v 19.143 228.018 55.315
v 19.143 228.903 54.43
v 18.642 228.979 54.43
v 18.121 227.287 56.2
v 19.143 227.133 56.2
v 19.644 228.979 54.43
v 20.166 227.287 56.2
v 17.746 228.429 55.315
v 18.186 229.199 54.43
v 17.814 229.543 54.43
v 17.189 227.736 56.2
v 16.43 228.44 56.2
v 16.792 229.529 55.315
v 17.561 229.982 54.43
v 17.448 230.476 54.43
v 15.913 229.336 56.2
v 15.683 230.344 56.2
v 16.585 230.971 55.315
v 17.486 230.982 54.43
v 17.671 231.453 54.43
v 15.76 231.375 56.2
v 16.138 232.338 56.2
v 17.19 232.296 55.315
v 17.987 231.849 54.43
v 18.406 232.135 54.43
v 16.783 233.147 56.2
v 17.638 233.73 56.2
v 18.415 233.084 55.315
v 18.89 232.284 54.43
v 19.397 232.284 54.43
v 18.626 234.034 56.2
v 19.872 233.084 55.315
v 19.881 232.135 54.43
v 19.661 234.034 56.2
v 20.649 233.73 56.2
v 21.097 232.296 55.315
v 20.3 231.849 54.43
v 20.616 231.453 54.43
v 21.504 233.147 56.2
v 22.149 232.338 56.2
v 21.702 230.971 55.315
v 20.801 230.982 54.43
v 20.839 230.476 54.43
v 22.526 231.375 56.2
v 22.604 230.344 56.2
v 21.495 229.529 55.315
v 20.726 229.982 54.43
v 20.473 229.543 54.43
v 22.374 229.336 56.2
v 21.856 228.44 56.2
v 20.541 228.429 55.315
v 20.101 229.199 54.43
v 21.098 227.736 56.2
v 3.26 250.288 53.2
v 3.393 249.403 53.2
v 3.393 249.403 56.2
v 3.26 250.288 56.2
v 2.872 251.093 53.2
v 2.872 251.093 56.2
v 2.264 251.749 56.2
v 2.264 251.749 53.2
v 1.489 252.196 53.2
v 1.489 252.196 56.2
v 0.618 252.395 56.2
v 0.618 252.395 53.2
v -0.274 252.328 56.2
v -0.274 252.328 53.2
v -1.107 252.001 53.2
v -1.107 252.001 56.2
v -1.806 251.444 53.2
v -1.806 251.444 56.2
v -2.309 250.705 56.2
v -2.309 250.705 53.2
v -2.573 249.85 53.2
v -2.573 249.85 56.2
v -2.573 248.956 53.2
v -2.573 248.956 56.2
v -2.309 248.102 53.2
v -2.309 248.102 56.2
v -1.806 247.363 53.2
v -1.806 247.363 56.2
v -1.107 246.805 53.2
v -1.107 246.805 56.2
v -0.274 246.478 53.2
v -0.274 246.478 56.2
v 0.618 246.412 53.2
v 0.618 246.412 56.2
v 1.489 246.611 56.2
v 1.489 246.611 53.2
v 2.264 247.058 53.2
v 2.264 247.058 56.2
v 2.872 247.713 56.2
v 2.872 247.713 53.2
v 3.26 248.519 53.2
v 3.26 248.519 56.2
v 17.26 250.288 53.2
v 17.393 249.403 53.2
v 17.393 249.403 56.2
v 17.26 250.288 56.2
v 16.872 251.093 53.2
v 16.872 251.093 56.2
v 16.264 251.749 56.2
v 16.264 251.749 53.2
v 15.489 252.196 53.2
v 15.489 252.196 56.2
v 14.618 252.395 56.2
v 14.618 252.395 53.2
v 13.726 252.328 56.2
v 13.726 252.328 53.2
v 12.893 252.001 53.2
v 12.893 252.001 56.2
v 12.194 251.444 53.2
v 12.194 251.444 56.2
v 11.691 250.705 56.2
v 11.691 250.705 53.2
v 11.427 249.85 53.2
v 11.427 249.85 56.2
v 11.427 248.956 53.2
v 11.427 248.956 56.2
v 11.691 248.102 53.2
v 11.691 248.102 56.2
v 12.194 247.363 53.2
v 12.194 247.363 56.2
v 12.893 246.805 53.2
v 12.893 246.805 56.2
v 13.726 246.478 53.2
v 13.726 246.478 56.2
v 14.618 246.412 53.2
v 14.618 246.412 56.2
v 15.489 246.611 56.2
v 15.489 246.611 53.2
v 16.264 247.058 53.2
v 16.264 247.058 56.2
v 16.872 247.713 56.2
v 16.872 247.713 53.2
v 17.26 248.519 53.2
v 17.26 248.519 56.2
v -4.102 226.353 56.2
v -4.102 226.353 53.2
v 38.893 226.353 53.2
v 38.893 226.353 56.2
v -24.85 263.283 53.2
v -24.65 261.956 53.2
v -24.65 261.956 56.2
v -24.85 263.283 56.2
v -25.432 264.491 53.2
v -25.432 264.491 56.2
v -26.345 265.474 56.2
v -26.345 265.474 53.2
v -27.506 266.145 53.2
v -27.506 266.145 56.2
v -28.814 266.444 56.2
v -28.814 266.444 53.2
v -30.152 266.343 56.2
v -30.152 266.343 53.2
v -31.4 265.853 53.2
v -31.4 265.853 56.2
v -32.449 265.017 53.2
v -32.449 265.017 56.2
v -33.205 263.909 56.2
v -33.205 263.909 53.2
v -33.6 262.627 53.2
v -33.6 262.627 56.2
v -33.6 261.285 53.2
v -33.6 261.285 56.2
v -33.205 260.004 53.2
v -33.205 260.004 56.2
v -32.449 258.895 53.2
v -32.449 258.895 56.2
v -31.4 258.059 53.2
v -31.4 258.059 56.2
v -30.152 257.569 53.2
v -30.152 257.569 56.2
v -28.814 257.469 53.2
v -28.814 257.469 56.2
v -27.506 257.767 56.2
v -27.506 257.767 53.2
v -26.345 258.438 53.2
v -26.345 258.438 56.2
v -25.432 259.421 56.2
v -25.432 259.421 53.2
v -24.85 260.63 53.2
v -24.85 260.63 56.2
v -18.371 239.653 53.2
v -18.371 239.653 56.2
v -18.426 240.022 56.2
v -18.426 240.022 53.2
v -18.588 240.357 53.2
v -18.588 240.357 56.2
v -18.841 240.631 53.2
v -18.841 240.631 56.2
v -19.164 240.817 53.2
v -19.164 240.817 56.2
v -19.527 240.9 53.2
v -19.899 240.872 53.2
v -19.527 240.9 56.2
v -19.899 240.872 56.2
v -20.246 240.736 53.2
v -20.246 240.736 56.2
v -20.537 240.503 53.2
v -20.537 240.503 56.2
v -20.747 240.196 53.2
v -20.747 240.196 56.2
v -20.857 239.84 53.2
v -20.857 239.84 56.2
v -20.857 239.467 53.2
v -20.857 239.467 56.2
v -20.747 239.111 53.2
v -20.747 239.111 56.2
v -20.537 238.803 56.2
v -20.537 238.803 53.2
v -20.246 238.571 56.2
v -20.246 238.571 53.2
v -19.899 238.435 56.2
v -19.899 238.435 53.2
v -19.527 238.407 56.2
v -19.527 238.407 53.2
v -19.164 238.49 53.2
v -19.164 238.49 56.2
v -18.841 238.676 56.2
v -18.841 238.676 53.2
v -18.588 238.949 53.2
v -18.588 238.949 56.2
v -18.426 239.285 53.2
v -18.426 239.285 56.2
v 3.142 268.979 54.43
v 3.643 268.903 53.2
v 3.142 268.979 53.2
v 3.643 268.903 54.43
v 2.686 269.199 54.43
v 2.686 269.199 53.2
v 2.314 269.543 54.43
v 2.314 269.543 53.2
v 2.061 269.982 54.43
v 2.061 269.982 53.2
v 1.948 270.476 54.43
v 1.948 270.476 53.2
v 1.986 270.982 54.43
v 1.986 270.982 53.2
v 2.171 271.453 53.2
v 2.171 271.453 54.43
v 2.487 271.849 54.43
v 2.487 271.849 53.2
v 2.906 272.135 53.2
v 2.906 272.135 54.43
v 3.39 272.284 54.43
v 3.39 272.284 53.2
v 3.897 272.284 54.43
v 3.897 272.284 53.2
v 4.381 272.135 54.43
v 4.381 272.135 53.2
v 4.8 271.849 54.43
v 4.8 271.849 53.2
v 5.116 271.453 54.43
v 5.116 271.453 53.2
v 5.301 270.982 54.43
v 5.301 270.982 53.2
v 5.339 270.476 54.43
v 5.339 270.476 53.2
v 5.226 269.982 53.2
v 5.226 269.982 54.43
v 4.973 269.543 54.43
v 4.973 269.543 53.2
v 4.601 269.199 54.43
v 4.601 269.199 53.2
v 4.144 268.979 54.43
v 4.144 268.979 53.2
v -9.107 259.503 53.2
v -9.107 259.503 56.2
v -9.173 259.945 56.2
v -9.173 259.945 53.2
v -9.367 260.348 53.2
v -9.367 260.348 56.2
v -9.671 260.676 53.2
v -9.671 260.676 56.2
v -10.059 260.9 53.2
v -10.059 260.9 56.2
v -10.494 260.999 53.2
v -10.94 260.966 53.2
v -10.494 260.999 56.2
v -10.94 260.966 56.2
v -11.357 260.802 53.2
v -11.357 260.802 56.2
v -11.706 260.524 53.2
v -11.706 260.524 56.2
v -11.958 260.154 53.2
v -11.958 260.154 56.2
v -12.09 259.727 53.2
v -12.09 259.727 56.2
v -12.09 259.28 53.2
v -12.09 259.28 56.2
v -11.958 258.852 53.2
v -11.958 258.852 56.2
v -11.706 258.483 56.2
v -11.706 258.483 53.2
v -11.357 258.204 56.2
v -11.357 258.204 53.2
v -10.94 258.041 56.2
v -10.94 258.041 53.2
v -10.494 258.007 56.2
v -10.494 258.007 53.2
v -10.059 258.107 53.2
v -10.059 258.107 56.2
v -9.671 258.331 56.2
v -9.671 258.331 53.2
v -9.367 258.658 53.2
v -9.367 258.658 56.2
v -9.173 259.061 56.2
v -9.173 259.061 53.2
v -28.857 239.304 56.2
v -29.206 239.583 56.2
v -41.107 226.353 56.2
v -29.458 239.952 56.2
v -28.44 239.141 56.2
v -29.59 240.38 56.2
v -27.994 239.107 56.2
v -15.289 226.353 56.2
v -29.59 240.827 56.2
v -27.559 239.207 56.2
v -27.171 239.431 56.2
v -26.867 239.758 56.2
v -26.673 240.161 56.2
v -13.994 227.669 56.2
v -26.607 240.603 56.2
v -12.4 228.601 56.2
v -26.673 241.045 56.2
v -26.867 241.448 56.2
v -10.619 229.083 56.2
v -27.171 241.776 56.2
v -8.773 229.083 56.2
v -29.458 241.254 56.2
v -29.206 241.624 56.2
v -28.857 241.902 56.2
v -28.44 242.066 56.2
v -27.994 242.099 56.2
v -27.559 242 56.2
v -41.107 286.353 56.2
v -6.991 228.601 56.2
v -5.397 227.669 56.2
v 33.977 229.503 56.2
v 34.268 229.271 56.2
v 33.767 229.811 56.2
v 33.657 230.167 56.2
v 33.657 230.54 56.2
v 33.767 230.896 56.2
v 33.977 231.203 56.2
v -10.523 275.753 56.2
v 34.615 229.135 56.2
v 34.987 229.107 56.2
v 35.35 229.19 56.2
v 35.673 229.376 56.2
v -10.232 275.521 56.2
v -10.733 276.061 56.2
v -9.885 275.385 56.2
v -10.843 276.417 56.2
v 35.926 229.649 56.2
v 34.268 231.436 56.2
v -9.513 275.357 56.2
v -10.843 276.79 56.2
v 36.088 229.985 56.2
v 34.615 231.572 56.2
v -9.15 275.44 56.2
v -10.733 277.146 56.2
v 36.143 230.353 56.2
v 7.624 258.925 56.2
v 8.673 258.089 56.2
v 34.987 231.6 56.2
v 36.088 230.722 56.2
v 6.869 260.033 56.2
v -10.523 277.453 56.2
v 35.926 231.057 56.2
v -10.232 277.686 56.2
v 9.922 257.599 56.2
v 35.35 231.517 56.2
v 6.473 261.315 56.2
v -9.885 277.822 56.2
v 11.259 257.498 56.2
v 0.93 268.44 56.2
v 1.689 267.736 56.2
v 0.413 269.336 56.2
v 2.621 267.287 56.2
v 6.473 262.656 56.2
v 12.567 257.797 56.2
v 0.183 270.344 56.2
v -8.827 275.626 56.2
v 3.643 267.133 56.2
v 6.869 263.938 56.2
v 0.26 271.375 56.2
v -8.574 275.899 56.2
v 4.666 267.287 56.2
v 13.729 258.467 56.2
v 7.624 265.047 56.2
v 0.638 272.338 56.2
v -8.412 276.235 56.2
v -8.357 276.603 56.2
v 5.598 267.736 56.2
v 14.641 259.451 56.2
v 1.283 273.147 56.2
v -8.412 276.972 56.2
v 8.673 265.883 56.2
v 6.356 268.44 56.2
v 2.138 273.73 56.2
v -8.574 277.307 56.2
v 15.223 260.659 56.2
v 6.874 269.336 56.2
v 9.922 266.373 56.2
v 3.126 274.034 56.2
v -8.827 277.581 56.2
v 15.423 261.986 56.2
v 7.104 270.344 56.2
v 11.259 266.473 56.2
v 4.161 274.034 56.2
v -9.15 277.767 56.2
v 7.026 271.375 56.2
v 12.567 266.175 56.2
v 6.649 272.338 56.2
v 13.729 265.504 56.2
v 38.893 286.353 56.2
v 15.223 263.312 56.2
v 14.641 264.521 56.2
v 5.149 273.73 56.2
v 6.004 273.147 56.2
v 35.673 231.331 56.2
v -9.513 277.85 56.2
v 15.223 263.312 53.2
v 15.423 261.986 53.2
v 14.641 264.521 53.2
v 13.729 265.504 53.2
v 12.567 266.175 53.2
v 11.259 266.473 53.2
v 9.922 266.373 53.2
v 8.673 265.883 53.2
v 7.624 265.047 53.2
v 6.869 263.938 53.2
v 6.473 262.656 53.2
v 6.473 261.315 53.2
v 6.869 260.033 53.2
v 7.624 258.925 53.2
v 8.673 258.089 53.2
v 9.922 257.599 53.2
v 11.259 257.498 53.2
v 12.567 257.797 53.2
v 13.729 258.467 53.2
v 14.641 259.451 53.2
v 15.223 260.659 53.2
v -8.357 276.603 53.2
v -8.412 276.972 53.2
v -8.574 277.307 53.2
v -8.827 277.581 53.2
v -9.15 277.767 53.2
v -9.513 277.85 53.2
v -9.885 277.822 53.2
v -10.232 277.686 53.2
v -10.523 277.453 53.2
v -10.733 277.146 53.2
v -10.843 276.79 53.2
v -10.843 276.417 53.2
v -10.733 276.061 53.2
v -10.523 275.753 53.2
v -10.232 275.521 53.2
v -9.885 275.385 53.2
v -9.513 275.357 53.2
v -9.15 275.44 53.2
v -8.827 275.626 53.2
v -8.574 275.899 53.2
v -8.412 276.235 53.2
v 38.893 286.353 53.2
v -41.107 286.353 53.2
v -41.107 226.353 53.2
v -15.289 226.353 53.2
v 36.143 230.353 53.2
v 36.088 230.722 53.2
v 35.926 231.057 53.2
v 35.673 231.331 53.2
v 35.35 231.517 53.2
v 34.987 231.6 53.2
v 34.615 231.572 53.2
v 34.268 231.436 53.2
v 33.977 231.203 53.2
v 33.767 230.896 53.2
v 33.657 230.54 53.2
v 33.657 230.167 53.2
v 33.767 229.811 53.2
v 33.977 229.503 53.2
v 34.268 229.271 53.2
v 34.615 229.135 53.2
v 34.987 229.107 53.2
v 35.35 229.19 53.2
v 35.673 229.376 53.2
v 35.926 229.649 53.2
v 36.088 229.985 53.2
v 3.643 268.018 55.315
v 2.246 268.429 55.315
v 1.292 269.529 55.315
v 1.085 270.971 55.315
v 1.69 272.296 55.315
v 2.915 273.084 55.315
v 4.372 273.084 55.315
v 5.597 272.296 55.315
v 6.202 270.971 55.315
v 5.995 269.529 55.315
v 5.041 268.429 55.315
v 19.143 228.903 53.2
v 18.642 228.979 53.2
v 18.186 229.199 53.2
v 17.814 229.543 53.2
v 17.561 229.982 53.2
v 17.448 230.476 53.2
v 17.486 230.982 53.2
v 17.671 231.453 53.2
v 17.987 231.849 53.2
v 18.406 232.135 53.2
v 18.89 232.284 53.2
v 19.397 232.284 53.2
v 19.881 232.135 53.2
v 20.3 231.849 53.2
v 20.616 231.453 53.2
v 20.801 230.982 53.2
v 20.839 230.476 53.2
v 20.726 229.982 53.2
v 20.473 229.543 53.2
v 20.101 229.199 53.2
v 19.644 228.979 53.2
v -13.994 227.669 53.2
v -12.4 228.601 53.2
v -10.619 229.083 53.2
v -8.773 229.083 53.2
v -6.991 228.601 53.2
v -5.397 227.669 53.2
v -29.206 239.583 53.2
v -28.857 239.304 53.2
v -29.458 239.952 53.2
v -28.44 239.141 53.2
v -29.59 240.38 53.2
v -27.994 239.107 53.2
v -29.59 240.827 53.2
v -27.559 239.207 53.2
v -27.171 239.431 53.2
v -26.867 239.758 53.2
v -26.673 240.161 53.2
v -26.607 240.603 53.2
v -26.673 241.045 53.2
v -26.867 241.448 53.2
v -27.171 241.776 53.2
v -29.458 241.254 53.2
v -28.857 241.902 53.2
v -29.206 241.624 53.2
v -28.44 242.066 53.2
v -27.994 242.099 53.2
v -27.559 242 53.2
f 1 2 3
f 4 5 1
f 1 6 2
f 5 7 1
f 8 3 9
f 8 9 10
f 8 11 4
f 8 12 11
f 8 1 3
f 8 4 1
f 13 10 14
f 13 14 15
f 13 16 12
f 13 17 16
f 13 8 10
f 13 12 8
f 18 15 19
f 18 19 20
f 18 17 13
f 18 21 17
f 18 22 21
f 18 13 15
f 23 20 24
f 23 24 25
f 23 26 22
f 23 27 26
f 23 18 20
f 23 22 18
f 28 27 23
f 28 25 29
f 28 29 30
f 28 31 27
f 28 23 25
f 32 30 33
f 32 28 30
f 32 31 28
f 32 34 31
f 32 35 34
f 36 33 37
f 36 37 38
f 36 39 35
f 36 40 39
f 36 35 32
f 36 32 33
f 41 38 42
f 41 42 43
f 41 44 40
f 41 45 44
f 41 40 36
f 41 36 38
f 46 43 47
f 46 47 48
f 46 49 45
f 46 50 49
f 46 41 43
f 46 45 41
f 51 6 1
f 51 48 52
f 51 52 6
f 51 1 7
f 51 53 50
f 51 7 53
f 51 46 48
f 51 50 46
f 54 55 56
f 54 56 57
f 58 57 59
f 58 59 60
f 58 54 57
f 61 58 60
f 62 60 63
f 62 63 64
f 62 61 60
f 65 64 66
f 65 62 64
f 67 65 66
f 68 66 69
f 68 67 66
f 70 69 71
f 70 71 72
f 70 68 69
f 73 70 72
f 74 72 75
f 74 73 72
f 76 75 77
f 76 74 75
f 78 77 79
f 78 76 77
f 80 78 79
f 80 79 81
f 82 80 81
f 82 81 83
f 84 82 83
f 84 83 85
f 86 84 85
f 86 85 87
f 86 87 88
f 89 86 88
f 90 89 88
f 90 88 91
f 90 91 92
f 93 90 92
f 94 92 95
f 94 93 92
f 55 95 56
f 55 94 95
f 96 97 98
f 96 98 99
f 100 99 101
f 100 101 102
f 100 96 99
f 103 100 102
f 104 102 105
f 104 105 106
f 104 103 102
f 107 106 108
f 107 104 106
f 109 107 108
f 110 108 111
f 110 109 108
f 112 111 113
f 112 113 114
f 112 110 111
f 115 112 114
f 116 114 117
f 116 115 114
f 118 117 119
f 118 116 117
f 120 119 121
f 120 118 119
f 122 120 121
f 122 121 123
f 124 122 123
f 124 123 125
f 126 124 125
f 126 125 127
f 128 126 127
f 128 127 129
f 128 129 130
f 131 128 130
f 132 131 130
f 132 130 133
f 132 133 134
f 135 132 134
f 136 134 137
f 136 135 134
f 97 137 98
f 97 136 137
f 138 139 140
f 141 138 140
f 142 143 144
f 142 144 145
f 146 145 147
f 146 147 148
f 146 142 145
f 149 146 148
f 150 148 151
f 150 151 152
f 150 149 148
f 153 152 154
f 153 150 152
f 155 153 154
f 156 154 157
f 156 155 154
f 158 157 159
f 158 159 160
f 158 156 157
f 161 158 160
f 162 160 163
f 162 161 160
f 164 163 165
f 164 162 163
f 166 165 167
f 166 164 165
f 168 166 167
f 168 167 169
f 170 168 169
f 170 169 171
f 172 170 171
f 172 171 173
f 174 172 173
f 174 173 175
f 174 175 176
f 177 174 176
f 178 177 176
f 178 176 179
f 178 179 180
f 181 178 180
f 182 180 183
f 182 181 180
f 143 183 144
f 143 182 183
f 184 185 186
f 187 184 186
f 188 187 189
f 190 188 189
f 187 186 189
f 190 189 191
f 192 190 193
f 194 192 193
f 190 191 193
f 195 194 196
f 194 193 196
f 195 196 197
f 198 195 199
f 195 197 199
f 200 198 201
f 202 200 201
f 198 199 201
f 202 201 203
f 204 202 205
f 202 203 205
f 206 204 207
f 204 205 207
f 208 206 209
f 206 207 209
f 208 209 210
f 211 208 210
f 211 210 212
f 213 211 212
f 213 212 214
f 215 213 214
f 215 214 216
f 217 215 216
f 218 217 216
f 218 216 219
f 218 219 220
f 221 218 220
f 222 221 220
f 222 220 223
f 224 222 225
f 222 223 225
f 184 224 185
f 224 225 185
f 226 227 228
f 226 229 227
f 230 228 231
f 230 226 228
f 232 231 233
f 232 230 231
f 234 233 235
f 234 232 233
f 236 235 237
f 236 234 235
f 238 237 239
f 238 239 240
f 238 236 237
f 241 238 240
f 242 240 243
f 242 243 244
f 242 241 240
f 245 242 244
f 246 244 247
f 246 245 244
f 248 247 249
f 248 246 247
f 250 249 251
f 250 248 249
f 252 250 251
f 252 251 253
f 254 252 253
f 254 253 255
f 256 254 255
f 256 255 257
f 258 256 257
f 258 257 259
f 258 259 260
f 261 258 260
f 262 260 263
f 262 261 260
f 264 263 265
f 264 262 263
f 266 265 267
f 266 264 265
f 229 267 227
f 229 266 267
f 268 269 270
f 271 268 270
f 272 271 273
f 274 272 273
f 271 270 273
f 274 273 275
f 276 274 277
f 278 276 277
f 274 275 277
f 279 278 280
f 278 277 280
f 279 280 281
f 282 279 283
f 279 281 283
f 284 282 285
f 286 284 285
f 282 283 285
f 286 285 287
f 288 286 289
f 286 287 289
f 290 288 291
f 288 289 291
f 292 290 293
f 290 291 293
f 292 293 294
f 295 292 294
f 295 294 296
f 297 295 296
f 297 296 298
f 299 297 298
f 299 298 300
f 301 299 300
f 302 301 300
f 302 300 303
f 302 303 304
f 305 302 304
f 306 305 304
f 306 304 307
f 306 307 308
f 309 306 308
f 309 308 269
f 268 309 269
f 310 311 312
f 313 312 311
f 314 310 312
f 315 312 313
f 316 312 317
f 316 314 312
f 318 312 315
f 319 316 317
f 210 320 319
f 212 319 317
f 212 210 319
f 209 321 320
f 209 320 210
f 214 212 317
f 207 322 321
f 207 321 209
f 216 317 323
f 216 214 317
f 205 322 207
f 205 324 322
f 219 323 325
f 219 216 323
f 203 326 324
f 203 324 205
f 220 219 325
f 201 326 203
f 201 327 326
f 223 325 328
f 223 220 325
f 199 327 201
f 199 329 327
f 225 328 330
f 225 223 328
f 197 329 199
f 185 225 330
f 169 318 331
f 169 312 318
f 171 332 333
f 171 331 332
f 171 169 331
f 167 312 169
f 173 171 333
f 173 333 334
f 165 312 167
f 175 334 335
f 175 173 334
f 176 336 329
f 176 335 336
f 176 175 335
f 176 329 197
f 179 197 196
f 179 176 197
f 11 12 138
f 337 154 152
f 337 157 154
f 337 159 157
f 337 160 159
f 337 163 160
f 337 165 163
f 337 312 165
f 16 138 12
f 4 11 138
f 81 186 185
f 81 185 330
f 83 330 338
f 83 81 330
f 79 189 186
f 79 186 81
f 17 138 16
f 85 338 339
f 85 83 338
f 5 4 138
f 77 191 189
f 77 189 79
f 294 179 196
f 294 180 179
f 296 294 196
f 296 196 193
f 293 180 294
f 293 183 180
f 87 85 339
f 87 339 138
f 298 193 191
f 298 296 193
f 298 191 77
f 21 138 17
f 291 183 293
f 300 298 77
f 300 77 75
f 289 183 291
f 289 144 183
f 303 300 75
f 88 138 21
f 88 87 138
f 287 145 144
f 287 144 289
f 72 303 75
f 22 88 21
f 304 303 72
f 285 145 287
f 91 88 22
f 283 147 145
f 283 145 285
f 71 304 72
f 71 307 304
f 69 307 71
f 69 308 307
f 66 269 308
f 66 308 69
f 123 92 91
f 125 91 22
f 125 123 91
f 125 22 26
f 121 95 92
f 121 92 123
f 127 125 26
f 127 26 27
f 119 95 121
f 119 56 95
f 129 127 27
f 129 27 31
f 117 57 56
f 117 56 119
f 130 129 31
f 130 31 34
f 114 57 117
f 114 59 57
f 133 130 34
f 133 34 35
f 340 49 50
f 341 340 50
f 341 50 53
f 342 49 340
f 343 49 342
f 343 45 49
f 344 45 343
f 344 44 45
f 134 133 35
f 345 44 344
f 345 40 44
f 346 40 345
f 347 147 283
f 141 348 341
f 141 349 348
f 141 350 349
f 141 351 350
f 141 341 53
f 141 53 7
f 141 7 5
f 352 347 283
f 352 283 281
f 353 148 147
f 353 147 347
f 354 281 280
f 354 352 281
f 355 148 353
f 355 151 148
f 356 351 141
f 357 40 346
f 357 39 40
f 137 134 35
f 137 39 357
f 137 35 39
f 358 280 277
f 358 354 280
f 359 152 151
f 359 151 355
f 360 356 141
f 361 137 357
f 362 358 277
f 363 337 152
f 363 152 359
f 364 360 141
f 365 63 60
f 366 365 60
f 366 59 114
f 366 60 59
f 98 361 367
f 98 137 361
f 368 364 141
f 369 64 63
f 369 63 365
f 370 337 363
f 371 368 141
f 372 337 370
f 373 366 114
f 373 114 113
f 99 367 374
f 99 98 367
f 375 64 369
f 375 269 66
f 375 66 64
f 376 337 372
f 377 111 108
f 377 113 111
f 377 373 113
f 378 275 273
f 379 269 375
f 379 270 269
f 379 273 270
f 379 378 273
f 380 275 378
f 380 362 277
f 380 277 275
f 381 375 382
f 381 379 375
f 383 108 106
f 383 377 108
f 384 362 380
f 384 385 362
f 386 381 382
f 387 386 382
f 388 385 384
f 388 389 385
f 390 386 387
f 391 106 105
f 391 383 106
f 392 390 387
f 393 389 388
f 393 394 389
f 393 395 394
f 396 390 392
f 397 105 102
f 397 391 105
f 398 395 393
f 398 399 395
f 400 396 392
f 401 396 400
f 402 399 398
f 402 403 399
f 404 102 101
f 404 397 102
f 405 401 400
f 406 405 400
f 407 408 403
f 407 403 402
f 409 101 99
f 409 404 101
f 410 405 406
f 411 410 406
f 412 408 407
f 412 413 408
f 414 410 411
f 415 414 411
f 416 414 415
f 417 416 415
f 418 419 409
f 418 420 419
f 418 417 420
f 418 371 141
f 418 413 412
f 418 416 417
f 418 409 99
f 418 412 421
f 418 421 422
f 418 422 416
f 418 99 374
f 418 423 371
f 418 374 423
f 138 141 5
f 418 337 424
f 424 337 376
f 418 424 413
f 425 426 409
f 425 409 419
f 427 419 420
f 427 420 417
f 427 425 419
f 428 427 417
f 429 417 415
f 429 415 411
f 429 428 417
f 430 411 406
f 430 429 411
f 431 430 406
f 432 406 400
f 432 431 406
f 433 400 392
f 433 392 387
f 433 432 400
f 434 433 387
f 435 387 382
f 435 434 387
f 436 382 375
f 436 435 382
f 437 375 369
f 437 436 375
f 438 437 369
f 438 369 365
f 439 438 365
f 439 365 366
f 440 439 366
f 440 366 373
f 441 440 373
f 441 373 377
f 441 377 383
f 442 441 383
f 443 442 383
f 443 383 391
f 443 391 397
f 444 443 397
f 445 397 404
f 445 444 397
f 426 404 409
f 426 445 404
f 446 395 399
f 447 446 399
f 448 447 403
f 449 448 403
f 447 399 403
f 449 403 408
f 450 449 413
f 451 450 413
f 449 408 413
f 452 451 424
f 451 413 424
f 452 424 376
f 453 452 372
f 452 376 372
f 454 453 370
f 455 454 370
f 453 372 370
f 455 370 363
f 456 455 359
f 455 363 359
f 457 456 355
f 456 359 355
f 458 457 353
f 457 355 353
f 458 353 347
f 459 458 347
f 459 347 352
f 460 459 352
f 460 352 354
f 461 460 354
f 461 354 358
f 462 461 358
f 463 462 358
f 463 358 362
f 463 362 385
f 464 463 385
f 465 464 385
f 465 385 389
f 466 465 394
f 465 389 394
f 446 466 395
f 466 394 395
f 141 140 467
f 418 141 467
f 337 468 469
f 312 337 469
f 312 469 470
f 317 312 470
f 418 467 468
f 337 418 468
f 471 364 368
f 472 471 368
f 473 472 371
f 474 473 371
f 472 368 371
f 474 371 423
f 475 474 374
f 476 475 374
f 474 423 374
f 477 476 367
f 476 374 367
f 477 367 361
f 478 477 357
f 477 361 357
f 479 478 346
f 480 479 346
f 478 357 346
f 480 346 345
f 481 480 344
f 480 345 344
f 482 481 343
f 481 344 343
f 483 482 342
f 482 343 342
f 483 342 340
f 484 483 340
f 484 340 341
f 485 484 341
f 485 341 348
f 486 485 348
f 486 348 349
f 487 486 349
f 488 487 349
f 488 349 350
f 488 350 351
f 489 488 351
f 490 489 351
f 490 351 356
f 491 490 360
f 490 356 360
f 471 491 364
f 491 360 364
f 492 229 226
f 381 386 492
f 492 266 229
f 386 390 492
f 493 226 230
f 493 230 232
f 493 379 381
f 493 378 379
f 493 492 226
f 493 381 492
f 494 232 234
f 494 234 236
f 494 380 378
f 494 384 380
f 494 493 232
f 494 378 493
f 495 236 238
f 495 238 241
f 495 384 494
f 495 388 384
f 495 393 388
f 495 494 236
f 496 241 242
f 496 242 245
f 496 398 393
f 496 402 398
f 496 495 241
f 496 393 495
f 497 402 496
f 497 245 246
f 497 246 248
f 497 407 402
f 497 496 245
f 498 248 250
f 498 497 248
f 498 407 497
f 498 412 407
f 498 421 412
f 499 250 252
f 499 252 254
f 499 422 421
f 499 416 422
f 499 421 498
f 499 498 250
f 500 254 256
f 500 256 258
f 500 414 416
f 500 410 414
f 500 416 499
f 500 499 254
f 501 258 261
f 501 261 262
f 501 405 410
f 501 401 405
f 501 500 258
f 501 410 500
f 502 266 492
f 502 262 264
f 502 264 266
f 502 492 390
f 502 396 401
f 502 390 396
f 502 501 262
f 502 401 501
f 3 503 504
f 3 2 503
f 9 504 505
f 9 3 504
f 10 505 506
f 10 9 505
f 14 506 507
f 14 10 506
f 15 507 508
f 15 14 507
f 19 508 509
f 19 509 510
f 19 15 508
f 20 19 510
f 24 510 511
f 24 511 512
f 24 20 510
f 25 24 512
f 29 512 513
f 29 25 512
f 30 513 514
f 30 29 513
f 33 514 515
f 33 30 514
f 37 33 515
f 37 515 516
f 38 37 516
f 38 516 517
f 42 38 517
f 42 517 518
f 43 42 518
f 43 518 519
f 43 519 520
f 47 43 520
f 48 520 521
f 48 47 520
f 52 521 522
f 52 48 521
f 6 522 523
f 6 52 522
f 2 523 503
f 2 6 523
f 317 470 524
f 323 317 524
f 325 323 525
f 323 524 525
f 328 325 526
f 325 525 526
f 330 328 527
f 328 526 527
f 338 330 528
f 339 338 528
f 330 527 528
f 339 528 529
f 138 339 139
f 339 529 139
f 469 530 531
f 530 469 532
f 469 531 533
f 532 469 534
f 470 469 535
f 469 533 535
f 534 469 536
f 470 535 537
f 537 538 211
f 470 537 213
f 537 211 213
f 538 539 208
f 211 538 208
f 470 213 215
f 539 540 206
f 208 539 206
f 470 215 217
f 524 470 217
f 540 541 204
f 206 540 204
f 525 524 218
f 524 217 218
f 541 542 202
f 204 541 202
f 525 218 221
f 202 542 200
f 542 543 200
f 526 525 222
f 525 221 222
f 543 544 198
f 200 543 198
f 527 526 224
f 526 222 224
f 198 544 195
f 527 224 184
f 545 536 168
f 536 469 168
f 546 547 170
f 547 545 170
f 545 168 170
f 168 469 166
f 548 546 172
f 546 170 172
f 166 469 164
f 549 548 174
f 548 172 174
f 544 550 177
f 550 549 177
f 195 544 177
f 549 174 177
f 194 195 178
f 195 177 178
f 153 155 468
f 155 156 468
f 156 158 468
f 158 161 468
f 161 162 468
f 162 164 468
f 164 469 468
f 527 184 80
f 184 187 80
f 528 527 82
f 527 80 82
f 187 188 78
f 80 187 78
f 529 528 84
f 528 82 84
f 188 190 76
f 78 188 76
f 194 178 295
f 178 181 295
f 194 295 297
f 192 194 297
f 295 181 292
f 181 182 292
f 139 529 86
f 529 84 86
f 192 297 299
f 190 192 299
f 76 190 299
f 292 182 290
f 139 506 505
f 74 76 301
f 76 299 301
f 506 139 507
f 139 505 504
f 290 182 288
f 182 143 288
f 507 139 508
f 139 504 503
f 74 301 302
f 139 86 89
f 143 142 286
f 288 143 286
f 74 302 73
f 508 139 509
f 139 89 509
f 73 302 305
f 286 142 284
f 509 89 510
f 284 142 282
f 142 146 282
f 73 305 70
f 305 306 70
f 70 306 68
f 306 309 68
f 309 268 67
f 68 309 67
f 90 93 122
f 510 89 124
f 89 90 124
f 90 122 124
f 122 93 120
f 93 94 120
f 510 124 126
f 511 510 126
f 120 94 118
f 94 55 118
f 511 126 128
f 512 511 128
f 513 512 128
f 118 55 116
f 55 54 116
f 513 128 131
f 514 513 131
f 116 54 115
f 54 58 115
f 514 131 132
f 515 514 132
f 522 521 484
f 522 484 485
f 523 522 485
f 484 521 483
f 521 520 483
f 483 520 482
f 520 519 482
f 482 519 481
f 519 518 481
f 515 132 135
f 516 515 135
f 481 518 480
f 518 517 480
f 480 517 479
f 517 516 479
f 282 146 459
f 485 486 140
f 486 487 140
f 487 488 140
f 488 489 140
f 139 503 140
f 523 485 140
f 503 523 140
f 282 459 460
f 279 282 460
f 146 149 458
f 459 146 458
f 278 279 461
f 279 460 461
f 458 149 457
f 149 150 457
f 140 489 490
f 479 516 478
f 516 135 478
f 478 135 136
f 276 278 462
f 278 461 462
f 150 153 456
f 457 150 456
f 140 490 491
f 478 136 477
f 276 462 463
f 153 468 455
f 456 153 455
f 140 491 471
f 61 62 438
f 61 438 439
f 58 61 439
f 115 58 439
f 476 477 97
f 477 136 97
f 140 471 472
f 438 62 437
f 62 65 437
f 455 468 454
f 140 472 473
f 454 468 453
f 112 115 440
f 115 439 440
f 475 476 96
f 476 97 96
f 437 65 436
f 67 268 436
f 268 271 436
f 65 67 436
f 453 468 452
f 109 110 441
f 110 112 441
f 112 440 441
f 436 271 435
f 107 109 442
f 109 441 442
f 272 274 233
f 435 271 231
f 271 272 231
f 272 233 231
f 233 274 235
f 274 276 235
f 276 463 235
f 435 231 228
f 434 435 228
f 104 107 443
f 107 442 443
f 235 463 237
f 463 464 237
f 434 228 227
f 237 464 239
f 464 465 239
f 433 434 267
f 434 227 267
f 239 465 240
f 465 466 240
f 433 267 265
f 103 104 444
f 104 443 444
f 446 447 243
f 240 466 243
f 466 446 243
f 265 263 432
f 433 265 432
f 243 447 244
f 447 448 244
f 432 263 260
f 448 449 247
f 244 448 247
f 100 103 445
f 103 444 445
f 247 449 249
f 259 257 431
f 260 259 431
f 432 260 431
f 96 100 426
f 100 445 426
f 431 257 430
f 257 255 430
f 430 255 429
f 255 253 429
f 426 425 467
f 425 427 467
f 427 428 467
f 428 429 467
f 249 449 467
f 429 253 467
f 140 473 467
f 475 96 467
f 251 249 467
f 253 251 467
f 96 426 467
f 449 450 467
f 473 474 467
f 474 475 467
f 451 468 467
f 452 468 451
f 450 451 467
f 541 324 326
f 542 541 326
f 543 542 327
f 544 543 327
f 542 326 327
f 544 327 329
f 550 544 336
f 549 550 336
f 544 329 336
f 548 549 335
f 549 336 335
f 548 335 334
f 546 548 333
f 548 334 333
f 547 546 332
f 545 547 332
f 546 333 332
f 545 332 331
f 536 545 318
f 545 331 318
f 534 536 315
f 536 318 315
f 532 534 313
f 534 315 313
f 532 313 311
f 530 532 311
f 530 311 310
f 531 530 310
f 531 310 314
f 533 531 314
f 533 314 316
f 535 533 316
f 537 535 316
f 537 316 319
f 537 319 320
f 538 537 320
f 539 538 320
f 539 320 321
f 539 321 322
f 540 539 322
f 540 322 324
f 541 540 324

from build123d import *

# Parameters (mm, degrees)
SKETCH_1_R                                   = 3
SKETCH_1_R_2                                 = 4.5
EXTRUDE_1_DEPTH                              = 3
CSK_FOR_M3_HEX_SOCKET_COUNTERSUNK_HE_2_COUNT = 2
CSK_FOR_M3_HEX_SOCKET_COUNTERSUNK_HE_2_PITCH = 42.898135158
SKETCH_2_R                                   = 1.5
SKETCH_2_R_2                                 = 1.25
CUT_EXTRUDE1_DEPTH                           = 10
SKETCH4_R                                    = 1.25
CUT_EXTRUDE2_DEPTH                           = 3


with BuildPart() as part:
    # Эскиз1 → Бобышка-Вытянуть1 (new body)
    with BuildSketch(Plane.XY.offset(53.2)):
        with BuildLine():
            Line((-4.102180416, 226.353254388), (38.893407272, 226.353254388))
            Line((38.893407272, 226.353254388), (38.893407272, 286.353254388))
            Line((38.893407272, 286.353254388), (-41.106592728, 286.353254388))
            Line((-41.106592728, 286.353254388), (-41.106592728, 226.353254388))
            Line((-41.106592728, 226.353254388), (-15.28891158, 226.353254388))
            ThreePointArc((-15.28891158, 226.353254388), (-9.695545998, 229.144425829), (-4.102180416, 226.353254388))
        make_face()
        with Locations((0.393407272, 249.403254388)):
            Circle(SKETCH_1_R, mode=Mode.SUBTRACT)
        with Locations((14.393407272, 249.403254388)):
            Circle(SKETCH_1_R, mode=Mode.SUBTRACT)
        with Locations((-29.150473778, 261.95614373)):
            Circle(SKETCH_1_R_2, mode=Mode.SUBTRACT)
        with Locations((10.923063266, 261.985726175)):
            Circle(SKETCH_1_R_2, mode=Mode.SUBTRACT)
    extrude(amount=EXTRUDE_1_DEPTH)

    # Sketch3 → CSK for M3 Hex Socket Countersunk Head Screw1 (revolve, cut)
    with BuildSketch(Plane(origin=(3.643407272, 270.603254388, 56.2), x_dir=(0, -1, 0), z_dir=(1, 0, 0))):
        Polygon((0, 0), (0, 3), (1.7, 3), (1.7, 1.77), (3.47, 0), align=None)
    csk_for_m3_hex_socket_countersunk_head_s = revolve(axis=Axis((3.643407272, 270.603254388, 62.55), (0, 0, -1)), mode=Mode.SUBTRACT)

    # CSK for M3 Hex Socket Countersunk He 2: CSK for M3 Hex Socket Countersunk Head Screw1 ×2
    with Locations(*[Vector(0.36132106775864725, -0.9324414651836066, 0) * (i * CSK_FOR_M3_HEX_SOCKET_COUNTERSUNK_HE_2_PITCH) for i in range(1, CSK_FOR_M3_HEX_SOCKET_COUNTERSUNK_HE_2_COUNT)]):
        add(csk_for_m3_hex_socket_countersunk_head_s, mode=Mode.SUBTRACT)

    # Эскиз2 → Cut-Extrude1 (cut)
    with BuildSketch(Plane.XY.offset(56.2)):
        with Locations((-28.106592728, 240.603254388)):
            Circle(SKETCH_2_R)
        with Locations((-10.606592728, 259.503254388)):
            Circle(SKETCH_2_R)
        with Locations((3.643407272, 270.603254388)):
            Circle(SKETCH_2_R_2)
        with Locations((19.143407272, 230.603254388)):
            Circle(SKETCH_2_R_2)
    extrude(amount=-CUT_EXTRUDE1_DEPTH, mode=Mode.SUBTRACT)

    # Sketch4 → Cut-Extrude2 (cut)
    with BuildSketch(Plane.XY.offset(56.2)):
        with Locations((-9.606592728, 276.603254388)):
            Circle(SKETCH4_R)
        with Locations((-19.620743586, 239.653254388)):
            Circle(SKETCH4_R)
        with Locations((34.893407272, 230.353254388)):
            Circle(SKETCH4_R)
    extrude(amount=-CUT_EXTRUDE2_DEPTH, mode=Mode.SUBTRACT)


solid = part.part
